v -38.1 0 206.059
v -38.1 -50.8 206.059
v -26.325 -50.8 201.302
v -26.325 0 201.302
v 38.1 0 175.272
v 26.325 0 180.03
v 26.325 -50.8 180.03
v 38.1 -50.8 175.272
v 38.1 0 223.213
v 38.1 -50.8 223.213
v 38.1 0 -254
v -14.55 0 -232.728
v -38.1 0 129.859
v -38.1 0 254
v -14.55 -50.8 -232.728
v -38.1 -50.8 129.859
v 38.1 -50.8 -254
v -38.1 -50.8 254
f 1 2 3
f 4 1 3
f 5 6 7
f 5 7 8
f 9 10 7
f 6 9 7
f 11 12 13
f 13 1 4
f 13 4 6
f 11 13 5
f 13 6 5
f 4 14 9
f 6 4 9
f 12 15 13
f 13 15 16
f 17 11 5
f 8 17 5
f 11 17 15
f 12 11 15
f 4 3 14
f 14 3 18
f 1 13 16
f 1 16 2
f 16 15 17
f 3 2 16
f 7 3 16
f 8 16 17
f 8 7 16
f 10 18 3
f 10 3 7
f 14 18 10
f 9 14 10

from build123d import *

# Parameters (mm, degrees)
F0_W     = 76.2
F0_H     = 508
F1_DEPTH = 50.8
F3_DEPTH = 50.801
F5_DEPTH = 50.801
F7_DEPTH = 50.801


with BuildPart() as f1:
    # F0 (on Front) → F1 (new body)
    with BuildSketch(Plane.XZ):
        Rectangle(F0_W, F0_H)
    extrude(amount=F1_DEPTH)

    # F2 (on face) → F3 (cut, through all)
    with BuildSketch(Plane.XZ.offset(50.8)):
        Polygon((38.1, -254), (-38.1, -223.2132015914), (-38.1, -254), align=None)
        Polygon((38.1, 223.2132015914), (38.1, 254), (-38.1, 254), align=None)
    extrude(amount=-F3_DEPTH, mode=Mode.SUBTRACT)

    # F4 (on face) → F5 (cut, through all)
    with BuildSketch(Plane.XZ.offset(50.8)):
        Polygon((-26.324765047, 201.3016269516), (-38.1, 254), (-38.1, 206.059130688), align=None)
        Polygon((38.1, 175.2723322793), (38.1, 223.2132015914), (26.324765047, 180.0298360157), align=None)
    extrude(amount=-F5_DEPTH, mode=Mode.SUBTRACT)

    # F6 (on face) → F7 (cut, through all)
    with BuildSketch(Plane.XZ.offset(50.8)):
        Polygon((-14.549530094, -232.7282090641), (-38.1, 129.859130688), (-38.1, -223.2132015914), align=None)
    extrude(amount=-F7_DEPTH, mode=Mode.SUBTRACT)


solid = f1.part
